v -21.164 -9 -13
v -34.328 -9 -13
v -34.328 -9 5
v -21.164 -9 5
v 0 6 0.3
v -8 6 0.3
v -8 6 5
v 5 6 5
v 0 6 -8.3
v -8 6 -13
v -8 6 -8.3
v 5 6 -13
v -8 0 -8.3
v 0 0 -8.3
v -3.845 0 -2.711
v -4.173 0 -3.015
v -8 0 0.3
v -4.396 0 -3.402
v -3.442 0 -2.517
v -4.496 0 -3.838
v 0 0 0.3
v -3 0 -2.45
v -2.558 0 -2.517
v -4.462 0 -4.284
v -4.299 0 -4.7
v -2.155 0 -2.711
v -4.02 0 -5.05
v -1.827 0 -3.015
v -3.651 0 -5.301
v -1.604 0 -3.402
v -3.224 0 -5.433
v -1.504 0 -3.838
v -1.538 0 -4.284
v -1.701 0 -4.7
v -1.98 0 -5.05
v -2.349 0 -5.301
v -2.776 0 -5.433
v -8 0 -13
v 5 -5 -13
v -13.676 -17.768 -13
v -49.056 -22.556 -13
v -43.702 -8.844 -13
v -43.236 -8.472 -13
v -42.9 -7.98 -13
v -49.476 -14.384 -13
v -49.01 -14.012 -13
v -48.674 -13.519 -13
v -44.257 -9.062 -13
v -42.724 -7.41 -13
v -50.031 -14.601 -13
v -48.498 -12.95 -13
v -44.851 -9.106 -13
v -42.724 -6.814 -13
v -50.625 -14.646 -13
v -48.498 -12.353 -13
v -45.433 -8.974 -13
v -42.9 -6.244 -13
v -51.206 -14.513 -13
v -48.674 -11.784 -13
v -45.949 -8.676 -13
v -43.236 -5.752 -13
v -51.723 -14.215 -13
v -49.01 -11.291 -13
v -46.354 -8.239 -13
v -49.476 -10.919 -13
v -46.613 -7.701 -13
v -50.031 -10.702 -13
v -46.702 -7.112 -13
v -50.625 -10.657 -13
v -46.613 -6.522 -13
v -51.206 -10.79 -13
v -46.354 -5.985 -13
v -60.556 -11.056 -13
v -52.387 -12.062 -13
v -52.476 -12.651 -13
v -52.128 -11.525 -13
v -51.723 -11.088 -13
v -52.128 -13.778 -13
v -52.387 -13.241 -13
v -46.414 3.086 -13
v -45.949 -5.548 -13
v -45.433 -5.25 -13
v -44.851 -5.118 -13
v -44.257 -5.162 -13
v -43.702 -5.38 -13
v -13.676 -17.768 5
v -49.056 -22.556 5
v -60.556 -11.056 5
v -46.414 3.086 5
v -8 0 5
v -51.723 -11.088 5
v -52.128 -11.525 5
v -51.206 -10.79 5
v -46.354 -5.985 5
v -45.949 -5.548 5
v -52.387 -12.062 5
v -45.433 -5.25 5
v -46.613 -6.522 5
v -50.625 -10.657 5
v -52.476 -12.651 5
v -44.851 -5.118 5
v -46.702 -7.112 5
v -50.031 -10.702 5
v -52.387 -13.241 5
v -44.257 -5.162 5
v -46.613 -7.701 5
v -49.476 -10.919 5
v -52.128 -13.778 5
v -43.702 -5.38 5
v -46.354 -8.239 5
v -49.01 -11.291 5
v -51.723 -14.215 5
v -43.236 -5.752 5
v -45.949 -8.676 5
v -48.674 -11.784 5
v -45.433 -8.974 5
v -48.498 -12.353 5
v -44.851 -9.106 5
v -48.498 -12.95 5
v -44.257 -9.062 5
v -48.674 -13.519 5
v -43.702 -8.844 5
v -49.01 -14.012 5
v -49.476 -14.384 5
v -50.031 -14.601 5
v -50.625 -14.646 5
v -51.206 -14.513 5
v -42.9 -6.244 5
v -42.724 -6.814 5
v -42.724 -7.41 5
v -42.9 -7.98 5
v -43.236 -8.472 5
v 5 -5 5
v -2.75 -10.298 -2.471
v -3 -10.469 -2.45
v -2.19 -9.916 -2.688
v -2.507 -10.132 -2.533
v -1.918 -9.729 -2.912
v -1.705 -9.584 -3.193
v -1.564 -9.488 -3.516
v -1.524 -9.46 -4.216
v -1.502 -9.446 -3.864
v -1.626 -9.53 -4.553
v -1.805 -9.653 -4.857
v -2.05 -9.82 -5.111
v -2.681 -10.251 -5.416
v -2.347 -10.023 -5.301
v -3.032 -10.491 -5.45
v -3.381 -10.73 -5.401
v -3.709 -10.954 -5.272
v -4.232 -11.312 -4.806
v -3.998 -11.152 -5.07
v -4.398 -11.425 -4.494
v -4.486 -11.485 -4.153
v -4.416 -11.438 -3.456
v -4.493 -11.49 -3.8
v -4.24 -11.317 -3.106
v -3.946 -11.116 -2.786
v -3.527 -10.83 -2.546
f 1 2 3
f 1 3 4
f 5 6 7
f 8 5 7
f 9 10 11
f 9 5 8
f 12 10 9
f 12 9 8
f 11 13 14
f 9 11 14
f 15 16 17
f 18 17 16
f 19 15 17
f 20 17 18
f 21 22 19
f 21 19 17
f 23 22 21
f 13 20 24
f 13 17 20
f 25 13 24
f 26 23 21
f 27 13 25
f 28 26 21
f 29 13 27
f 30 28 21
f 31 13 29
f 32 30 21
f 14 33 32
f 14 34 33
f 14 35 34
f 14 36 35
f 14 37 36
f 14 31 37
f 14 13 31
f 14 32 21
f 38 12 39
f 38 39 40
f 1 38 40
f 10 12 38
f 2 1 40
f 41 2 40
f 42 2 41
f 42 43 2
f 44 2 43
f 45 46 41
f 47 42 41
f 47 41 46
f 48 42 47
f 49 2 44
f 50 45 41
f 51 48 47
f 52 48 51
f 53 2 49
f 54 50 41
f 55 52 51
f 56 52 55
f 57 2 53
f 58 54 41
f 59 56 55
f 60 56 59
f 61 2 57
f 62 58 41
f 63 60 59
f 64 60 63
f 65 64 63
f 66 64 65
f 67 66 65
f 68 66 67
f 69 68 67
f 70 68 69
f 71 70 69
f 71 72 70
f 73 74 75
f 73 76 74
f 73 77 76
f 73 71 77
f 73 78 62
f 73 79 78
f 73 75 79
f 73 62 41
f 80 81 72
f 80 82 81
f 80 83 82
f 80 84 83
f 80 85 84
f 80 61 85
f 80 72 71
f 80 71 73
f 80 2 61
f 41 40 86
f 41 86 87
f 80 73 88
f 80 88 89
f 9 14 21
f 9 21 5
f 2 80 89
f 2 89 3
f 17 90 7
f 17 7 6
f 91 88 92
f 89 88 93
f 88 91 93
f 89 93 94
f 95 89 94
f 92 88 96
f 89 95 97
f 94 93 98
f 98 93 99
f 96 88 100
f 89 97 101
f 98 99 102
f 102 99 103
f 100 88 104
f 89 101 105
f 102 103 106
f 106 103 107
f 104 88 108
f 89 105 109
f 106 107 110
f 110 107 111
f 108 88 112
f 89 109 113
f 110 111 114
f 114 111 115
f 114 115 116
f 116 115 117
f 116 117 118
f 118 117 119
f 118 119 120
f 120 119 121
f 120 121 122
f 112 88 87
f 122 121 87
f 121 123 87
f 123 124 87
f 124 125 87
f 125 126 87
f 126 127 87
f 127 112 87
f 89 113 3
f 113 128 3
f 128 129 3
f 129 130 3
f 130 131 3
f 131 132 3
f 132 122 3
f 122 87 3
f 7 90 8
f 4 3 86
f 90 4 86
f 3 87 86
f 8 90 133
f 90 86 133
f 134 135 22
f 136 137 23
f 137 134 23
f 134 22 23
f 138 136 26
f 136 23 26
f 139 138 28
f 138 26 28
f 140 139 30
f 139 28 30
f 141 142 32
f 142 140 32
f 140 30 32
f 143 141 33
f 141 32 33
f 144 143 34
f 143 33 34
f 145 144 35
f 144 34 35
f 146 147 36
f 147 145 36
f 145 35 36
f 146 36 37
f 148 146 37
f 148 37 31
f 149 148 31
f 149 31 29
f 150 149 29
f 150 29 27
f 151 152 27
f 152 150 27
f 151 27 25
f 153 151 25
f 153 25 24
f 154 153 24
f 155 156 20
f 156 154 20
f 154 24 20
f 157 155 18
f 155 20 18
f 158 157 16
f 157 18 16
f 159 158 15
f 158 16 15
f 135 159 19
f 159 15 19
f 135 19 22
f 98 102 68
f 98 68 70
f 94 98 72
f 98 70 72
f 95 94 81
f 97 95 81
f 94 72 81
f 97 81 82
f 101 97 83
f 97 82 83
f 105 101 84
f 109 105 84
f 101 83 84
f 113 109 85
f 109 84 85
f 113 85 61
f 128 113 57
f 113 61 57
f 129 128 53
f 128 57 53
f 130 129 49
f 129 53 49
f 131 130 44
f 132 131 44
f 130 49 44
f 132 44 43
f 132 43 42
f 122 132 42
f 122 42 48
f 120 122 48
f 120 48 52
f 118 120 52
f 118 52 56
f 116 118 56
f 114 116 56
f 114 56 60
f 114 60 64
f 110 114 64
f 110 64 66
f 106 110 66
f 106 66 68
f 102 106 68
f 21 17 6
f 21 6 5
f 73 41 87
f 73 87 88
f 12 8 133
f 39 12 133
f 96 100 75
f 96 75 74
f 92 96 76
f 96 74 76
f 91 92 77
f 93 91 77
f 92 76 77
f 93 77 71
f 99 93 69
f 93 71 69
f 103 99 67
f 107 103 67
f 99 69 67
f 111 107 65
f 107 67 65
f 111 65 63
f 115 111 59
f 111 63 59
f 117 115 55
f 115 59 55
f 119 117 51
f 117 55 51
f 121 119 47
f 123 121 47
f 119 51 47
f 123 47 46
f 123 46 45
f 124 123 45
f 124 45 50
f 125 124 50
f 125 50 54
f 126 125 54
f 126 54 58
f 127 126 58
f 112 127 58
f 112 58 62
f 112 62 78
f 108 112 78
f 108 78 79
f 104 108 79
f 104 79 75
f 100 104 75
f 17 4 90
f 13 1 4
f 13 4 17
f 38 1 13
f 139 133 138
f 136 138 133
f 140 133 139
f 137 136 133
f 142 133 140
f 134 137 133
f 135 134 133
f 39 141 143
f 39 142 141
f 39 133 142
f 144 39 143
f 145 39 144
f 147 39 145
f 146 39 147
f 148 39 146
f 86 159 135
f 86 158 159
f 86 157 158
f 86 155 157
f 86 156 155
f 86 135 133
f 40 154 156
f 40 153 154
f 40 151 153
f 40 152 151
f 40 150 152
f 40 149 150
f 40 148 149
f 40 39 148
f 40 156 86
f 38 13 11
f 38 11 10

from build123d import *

# Parameters (mm, degrees)
BOSS_EXTRUDE1_DEPTH      = 5
BOSS_EXTRUDE1_DEPTH_BACK = 13
SKETCH2_R                = 1.5
CUT_EXTRUDE1_DEPTH       = 66.915554427
SKETCH3_R                = 2
CUT_EXTRUDE2_DEPTH       = 68.080998169
SKETCH4_W                = 8
SKETCH4_H                = 4.7
BOSS_EXTRUDE2_DEPTH      = 6


with BuildPart() as part:
    # Sketch1 → Boss-Extrude1 (new, two sides: drawn at the far end of the back side and taken through both)
    with BuildSketch(Plane.XY.offset(-BOSS_EXTRUDE1_DEPTH_BACK)):
        Polygon((0, 6), (5, 6), (5, -5), (-13.675831366, -17.768137002), (-49.056349186, -22.556349186), (-60.556349186, -11.056349186), (-46.414213562, 3.085786438), (-34.328427125, -9), (-21.164213562, -9), (-8, 0), (0, 0), align=None)
    extrude(amount=BOSS_EXTRUDE1_DEPTH + BOSS_EXTRUDE1_DEPTH_BACK)

    # Sketch2 → Cut-Extrude1 (cut, through all)
    with BuildSketch(Plane(origin=(0, 0, 0), x_dir=(1, 0, 0), z_dir=(0, 1, 0))):
        with Locations(Location((-3, 3.95, 0), (0, 0, 270))):
            Circle(SKETCH2_R)
    extrude(amount=-CUT_EXTRUDE1_DEPTH, mode=Mode.SUBTRACT)

    # Sketch3 → Cut-Extrude2 (cut, through all)
    with BuildSketch(Plane(origin=(0, 0, -13), x_dir=(-1, 0, 0), z_dir=(0, 0, -1))):
        with Locations((50.475737372, -12.65147749)):
            Circle(SKETCH3_R)
        with Locations((44.701932157, -7.111978477)):
            Circle(SKETCH3_R)
    extrude(amount=-CUT_EXTRUDE2_DEPTH, mode=Mode.SUBTRACT)

    # Sketch4 → Boss-Extrude2 (add)
    with BuildSketch(Plane(origin=(0, 0, 0), x_dir=(1, 0, 0), z_dir=(0, 1, 0))):
        with Locations((-4, -2.65)):
            Rectangle(SKETCH4_W, SKETCH4_H)
        with Locations((-4, 10.65)):
            Rectangle(SKETCH4_W, SKETCH4_H)
    extrude(amount=BOSS_EXTRUDE2_DEPTH)


solid = part.part
